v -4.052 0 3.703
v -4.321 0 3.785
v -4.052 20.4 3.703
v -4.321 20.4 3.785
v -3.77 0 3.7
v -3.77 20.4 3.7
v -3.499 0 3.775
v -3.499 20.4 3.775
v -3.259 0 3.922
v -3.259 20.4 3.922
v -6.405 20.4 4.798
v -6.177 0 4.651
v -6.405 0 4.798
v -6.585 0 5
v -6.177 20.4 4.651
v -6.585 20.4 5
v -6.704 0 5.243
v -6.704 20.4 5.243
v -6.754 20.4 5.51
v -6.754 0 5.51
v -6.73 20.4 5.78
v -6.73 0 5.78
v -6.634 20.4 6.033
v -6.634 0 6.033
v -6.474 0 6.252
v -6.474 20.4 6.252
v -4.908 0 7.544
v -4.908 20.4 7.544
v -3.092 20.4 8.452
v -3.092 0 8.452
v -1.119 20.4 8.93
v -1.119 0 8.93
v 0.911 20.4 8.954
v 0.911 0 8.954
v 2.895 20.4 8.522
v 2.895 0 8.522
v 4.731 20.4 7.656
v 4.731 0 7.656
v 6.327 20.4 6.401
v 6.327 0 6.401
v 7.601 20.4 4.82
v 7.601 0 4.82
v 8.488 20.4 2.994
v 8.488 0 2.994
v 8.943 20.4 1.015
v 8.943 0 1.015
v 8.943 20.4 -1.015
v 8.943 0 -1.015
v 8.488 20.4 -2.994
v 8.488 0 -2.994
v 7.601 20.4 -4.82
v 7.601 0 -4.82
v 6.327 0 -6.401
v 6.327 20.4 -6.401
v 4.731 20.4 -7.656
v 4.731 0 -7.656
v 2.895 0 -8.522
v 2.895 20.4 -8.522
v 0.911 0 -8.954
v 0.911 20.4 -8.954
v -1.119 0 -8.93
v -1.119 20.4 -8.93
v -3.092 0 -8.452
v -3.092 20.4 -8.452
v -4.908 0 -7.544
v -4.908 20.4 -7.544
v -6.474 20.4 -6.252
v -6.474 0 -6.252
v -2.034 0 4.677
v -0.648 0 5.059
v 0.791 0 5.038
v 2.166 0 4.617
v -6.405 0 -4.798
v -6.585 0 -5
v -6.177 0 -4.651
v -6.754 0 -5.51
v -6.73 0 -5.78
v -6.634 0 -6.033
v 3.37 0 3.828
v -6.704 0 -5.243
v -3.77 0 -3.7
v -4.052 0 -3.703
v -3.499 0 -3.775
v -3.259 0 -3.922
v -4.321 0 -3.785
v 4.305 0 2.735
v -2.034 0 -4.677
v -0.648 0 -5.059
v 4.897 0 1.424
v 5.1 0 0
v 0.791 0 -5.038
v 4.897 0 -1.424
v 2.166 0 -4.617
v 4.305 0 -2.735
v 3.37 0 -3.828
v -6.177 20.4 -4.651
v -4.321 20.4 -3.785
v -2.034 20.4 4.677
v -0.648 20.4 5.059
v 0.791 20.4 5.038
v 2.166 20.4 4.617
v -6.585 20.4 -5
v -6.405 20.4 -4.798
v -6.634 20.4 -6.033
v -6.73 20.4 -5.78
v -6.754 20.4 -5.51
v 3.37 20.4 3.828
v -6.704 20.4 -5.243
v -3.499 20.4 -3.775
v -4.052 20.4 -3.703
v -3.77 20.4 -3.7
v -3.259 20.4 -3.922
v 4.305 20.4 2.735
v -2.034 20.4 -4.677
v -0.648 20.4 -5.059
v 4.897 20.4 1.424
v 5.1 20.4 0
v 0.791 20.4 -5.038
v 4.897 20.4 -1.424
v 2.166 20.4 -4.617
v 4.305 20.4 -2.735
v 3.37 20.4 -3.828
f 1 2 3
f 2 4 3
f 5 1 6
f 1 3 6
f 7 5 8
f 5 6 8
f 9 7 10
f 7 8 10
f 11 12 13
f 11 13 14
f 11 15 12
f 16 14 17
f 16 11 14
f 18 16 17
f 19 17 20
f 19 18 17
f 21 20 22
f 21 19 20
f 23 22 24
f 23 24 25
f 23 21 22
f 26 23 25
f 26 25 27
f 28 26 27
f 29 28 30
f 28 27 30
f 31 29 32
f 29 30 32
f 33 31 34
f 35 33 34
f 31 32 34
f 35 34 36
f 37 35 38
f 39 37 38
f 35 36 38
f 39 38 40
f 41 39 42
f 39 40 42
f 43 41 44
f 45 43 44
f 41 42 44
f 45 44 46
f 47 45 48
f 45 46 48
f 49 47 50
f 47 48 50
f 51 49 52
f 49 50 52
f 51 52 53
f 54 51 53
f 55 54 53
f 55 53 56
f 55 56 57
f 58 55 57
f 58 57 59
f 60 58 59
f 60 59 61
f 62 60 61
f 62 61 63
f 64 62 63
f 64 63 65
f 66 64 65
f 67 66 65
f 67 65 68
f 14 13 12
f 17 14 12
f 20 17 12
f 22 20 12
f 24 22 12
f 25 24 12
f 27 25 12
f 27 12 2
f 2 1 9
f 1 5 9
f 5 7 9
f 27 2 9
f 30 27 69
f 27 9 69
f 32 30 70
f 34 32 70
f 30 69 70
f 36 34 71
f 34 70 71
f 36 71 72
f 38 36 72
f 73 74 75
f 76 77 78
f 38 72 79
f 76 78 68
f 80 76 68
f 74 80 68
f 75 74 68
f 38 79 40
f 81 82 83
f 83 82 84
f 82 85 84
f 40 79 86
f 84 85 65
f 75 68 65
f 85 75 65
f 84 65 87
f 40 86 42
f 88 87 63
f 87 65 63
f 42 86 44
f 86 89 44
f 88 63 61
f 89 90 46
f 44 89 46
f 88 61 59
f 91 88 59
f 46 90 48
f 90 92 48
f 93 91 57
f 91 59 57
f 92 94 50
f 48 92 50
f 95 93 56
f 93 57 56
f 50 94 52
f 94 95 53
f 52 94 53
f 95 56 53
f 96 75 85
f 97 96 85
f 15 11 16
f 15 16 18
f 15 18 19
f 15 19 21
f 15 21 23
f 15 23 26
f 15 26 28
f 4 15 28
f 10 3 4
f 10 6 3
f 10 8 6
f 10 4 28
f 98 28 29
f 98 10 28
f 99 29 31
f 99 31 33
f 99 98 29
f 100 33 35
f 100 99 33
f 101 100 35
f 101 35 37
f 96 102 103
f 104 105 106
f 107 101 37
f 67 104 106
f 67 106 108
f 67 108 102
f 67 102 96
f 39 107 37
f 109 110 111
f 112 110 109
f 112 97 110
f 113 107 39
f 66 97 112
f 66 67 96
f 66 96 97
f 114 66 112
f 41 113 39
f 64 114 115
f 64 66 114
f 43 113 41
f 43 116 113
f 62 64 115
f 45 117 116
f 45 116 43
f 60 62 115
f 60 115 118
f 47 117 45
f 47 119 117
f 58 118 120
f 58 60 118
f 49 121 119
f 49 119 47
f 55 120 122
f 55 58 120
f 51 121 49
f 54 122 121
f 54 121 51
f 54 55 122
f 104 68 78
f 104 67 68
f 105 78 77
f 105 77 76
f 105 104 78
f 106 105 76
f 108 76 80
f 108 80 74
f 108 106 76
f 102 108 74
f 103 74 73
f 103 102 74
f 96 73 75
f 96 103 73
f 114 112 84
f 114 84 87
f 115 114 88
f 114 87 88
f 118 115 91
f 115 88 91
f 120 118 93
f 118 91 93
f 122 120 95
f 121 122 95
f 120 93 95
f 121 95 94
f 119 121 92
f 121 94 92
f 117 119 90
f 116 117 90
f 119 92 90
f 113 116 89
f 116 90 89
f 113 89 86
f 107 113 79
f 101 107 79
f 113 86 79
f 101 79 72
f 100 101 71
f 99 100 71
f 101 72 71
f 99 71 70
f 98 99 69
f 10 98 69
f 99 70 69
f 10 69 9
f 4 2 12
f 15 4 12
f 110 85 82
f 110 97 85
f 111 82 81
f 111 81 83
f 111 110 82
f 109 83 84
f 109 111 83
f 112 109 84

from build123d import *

# Parameters (mm, degrees)
BOSS_EXTRUDE1_DEPTH = 20.4
FILLET1_R           = 1


with BuildPart() as part:
    # Sketch1 → Boss-Extrude1 (new body)
    with BuildSketch(Plane(origin=(0, 0, 0), x_dir=(1, 0, 0), z_dir=(0, 1, 0))):
        with BuildLine():
            Line((-3.709447398, -3.5), (-7.348069674, -5.196717432))
            ThreePointArc((-7.348069674, -5.196717432), (9, 0), (-7.348069674, 5.196717432))
            Line((-7.348069674, 5.196717432), (-3.709447398, 3.5))
            ThreePointArc((-3.709447398, 3.5), (5.1, 0), (-3.709447398, -3.5))
        make_face()
    extrude(amount=BOSS_EXTRUDE1_DEPTH)

    # Fillet1
    fillet1_edges = [part.edges().sort_by_distance(p)[0] for p in [
        (-3.709447398, 10.2, -3.5),
        (-7.348069674, 10.2, -5.196717432),
        (-7.348069674, 10.2, 5.196717432),
        (-3.709447398, 10.2, 3.5),
    ]]
    fillet(fillet1_edges, radius=FILLET1_R)


solid = part.part
